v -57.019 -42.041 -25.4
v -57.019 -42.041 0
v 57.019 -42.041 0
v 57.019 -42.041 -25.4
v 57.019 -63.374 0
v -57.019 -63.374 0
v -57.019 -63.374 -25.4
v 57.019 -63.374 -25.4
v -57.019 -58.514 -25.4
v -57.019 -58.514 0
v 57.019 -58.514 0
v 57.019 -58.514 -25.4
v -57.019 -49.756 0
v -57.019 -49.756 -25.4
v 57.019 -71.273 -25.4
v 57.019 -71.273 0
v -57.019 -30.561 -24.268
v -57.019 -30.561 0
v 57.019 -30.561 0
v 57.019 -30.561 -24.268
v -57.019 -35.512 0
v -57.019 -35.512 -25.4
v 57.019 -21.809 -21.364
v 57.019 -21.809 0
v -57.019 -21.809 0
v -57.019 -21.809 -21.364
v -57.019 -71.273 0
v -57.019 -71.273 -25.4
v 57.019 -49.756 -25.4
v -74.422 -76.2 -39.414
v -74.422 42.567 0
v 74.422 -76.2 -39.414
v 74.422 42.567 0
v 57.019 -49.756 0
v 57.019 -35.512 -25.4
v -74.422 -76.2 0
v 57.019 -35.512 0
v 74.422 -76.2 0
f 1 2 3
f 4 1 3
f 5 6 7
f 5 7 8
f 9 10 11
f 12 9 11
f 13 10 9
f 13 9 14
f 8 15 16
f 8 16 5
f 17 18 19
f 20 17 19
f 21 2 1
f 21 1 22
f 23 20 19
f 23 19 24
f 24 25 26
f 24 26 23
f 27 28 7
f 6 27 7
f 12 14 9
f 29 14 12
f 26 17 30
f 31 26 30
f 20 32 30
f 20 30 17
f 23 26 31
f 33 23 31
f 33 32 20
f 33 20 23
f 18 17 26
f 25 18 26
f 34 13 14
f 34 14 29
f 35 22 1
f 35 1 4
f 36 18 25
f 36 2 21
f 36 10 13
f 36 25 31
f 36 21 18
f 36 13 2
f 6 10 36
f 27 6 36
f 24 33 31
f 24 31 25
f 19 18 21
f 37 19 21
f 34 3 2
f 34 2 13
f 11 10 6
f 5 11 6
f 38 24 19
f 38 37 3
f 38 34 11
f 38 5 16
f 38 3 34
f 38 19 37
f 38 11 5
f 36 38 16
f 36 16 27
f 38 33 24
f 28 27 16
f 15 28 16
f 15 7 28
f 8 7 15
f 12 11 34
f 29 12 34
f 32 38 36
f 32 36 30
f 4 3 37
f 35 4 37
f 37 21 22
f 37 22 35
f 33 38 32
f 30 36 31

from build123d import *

# Parameters (mm, degrees)
F2_DEPTH = 74.422
F0_W     = 114.037246
F0_H     = 8.752351
F3_DEPTH = 25.4
F0_W_2   = 114.037238
F0_H_2   = 6.529795
F4_DEPTH = 25.4
F0_W_3   = 114.03723
F0_H_3   = 8.757952
F5_DEPTH = 25.4
F0_H_4   = 7.899019
F6_DEPTH = 25.4


with BuildPart() as f2:
    # F1 (on Right) → F2 (new body, symmetric)
    with BuildSketch(Plane.YZ):
        Polygon((42.566895, 0), (-76.200001, 0), (-76.200001, -39.413795), align=None)
    extrude(amount=F2_DEPTH, both=True)

    # F0 (on Top) → F3 (cut)
    with BuildSketch(Plane.XY):
        with Locations((0, -26.185142)):
            Rectangle(F0_W, F0_H)
    extrude(amount=-F3_DEPTH, mode=Mode.SUBTRACT)

    # F0 (on Top) → F4 (cut)
    with BuildSketch(Plane.XY):
        with Locations((0, -38.776483)):
            Rectangle(F0_W_2, F0_H_2)
    extrude(amount=-F4_DEPTH, mode=Mode.SUBTRACT)

    # F0 (on Top) → F5 (cut)
    with BuildSketch(Plane.XY):
        with Locations((0, -54.135197)):
            Rectangle(F0_W_3, F0_H_3)
    extrude(amount=-F5_DEPTH, mode=Mode.SUBTRACT)

    # F0 (on Top) → F6 (cut)
    with BuildSketch(Plane.XY):
        with Locations((0, -67.32359)):
            Rectangle(F0_W, F0_H_4)
    extrude(amount=-F6_DEPTH, mode=Mode.SUBTRACT)


solid = f2.part
